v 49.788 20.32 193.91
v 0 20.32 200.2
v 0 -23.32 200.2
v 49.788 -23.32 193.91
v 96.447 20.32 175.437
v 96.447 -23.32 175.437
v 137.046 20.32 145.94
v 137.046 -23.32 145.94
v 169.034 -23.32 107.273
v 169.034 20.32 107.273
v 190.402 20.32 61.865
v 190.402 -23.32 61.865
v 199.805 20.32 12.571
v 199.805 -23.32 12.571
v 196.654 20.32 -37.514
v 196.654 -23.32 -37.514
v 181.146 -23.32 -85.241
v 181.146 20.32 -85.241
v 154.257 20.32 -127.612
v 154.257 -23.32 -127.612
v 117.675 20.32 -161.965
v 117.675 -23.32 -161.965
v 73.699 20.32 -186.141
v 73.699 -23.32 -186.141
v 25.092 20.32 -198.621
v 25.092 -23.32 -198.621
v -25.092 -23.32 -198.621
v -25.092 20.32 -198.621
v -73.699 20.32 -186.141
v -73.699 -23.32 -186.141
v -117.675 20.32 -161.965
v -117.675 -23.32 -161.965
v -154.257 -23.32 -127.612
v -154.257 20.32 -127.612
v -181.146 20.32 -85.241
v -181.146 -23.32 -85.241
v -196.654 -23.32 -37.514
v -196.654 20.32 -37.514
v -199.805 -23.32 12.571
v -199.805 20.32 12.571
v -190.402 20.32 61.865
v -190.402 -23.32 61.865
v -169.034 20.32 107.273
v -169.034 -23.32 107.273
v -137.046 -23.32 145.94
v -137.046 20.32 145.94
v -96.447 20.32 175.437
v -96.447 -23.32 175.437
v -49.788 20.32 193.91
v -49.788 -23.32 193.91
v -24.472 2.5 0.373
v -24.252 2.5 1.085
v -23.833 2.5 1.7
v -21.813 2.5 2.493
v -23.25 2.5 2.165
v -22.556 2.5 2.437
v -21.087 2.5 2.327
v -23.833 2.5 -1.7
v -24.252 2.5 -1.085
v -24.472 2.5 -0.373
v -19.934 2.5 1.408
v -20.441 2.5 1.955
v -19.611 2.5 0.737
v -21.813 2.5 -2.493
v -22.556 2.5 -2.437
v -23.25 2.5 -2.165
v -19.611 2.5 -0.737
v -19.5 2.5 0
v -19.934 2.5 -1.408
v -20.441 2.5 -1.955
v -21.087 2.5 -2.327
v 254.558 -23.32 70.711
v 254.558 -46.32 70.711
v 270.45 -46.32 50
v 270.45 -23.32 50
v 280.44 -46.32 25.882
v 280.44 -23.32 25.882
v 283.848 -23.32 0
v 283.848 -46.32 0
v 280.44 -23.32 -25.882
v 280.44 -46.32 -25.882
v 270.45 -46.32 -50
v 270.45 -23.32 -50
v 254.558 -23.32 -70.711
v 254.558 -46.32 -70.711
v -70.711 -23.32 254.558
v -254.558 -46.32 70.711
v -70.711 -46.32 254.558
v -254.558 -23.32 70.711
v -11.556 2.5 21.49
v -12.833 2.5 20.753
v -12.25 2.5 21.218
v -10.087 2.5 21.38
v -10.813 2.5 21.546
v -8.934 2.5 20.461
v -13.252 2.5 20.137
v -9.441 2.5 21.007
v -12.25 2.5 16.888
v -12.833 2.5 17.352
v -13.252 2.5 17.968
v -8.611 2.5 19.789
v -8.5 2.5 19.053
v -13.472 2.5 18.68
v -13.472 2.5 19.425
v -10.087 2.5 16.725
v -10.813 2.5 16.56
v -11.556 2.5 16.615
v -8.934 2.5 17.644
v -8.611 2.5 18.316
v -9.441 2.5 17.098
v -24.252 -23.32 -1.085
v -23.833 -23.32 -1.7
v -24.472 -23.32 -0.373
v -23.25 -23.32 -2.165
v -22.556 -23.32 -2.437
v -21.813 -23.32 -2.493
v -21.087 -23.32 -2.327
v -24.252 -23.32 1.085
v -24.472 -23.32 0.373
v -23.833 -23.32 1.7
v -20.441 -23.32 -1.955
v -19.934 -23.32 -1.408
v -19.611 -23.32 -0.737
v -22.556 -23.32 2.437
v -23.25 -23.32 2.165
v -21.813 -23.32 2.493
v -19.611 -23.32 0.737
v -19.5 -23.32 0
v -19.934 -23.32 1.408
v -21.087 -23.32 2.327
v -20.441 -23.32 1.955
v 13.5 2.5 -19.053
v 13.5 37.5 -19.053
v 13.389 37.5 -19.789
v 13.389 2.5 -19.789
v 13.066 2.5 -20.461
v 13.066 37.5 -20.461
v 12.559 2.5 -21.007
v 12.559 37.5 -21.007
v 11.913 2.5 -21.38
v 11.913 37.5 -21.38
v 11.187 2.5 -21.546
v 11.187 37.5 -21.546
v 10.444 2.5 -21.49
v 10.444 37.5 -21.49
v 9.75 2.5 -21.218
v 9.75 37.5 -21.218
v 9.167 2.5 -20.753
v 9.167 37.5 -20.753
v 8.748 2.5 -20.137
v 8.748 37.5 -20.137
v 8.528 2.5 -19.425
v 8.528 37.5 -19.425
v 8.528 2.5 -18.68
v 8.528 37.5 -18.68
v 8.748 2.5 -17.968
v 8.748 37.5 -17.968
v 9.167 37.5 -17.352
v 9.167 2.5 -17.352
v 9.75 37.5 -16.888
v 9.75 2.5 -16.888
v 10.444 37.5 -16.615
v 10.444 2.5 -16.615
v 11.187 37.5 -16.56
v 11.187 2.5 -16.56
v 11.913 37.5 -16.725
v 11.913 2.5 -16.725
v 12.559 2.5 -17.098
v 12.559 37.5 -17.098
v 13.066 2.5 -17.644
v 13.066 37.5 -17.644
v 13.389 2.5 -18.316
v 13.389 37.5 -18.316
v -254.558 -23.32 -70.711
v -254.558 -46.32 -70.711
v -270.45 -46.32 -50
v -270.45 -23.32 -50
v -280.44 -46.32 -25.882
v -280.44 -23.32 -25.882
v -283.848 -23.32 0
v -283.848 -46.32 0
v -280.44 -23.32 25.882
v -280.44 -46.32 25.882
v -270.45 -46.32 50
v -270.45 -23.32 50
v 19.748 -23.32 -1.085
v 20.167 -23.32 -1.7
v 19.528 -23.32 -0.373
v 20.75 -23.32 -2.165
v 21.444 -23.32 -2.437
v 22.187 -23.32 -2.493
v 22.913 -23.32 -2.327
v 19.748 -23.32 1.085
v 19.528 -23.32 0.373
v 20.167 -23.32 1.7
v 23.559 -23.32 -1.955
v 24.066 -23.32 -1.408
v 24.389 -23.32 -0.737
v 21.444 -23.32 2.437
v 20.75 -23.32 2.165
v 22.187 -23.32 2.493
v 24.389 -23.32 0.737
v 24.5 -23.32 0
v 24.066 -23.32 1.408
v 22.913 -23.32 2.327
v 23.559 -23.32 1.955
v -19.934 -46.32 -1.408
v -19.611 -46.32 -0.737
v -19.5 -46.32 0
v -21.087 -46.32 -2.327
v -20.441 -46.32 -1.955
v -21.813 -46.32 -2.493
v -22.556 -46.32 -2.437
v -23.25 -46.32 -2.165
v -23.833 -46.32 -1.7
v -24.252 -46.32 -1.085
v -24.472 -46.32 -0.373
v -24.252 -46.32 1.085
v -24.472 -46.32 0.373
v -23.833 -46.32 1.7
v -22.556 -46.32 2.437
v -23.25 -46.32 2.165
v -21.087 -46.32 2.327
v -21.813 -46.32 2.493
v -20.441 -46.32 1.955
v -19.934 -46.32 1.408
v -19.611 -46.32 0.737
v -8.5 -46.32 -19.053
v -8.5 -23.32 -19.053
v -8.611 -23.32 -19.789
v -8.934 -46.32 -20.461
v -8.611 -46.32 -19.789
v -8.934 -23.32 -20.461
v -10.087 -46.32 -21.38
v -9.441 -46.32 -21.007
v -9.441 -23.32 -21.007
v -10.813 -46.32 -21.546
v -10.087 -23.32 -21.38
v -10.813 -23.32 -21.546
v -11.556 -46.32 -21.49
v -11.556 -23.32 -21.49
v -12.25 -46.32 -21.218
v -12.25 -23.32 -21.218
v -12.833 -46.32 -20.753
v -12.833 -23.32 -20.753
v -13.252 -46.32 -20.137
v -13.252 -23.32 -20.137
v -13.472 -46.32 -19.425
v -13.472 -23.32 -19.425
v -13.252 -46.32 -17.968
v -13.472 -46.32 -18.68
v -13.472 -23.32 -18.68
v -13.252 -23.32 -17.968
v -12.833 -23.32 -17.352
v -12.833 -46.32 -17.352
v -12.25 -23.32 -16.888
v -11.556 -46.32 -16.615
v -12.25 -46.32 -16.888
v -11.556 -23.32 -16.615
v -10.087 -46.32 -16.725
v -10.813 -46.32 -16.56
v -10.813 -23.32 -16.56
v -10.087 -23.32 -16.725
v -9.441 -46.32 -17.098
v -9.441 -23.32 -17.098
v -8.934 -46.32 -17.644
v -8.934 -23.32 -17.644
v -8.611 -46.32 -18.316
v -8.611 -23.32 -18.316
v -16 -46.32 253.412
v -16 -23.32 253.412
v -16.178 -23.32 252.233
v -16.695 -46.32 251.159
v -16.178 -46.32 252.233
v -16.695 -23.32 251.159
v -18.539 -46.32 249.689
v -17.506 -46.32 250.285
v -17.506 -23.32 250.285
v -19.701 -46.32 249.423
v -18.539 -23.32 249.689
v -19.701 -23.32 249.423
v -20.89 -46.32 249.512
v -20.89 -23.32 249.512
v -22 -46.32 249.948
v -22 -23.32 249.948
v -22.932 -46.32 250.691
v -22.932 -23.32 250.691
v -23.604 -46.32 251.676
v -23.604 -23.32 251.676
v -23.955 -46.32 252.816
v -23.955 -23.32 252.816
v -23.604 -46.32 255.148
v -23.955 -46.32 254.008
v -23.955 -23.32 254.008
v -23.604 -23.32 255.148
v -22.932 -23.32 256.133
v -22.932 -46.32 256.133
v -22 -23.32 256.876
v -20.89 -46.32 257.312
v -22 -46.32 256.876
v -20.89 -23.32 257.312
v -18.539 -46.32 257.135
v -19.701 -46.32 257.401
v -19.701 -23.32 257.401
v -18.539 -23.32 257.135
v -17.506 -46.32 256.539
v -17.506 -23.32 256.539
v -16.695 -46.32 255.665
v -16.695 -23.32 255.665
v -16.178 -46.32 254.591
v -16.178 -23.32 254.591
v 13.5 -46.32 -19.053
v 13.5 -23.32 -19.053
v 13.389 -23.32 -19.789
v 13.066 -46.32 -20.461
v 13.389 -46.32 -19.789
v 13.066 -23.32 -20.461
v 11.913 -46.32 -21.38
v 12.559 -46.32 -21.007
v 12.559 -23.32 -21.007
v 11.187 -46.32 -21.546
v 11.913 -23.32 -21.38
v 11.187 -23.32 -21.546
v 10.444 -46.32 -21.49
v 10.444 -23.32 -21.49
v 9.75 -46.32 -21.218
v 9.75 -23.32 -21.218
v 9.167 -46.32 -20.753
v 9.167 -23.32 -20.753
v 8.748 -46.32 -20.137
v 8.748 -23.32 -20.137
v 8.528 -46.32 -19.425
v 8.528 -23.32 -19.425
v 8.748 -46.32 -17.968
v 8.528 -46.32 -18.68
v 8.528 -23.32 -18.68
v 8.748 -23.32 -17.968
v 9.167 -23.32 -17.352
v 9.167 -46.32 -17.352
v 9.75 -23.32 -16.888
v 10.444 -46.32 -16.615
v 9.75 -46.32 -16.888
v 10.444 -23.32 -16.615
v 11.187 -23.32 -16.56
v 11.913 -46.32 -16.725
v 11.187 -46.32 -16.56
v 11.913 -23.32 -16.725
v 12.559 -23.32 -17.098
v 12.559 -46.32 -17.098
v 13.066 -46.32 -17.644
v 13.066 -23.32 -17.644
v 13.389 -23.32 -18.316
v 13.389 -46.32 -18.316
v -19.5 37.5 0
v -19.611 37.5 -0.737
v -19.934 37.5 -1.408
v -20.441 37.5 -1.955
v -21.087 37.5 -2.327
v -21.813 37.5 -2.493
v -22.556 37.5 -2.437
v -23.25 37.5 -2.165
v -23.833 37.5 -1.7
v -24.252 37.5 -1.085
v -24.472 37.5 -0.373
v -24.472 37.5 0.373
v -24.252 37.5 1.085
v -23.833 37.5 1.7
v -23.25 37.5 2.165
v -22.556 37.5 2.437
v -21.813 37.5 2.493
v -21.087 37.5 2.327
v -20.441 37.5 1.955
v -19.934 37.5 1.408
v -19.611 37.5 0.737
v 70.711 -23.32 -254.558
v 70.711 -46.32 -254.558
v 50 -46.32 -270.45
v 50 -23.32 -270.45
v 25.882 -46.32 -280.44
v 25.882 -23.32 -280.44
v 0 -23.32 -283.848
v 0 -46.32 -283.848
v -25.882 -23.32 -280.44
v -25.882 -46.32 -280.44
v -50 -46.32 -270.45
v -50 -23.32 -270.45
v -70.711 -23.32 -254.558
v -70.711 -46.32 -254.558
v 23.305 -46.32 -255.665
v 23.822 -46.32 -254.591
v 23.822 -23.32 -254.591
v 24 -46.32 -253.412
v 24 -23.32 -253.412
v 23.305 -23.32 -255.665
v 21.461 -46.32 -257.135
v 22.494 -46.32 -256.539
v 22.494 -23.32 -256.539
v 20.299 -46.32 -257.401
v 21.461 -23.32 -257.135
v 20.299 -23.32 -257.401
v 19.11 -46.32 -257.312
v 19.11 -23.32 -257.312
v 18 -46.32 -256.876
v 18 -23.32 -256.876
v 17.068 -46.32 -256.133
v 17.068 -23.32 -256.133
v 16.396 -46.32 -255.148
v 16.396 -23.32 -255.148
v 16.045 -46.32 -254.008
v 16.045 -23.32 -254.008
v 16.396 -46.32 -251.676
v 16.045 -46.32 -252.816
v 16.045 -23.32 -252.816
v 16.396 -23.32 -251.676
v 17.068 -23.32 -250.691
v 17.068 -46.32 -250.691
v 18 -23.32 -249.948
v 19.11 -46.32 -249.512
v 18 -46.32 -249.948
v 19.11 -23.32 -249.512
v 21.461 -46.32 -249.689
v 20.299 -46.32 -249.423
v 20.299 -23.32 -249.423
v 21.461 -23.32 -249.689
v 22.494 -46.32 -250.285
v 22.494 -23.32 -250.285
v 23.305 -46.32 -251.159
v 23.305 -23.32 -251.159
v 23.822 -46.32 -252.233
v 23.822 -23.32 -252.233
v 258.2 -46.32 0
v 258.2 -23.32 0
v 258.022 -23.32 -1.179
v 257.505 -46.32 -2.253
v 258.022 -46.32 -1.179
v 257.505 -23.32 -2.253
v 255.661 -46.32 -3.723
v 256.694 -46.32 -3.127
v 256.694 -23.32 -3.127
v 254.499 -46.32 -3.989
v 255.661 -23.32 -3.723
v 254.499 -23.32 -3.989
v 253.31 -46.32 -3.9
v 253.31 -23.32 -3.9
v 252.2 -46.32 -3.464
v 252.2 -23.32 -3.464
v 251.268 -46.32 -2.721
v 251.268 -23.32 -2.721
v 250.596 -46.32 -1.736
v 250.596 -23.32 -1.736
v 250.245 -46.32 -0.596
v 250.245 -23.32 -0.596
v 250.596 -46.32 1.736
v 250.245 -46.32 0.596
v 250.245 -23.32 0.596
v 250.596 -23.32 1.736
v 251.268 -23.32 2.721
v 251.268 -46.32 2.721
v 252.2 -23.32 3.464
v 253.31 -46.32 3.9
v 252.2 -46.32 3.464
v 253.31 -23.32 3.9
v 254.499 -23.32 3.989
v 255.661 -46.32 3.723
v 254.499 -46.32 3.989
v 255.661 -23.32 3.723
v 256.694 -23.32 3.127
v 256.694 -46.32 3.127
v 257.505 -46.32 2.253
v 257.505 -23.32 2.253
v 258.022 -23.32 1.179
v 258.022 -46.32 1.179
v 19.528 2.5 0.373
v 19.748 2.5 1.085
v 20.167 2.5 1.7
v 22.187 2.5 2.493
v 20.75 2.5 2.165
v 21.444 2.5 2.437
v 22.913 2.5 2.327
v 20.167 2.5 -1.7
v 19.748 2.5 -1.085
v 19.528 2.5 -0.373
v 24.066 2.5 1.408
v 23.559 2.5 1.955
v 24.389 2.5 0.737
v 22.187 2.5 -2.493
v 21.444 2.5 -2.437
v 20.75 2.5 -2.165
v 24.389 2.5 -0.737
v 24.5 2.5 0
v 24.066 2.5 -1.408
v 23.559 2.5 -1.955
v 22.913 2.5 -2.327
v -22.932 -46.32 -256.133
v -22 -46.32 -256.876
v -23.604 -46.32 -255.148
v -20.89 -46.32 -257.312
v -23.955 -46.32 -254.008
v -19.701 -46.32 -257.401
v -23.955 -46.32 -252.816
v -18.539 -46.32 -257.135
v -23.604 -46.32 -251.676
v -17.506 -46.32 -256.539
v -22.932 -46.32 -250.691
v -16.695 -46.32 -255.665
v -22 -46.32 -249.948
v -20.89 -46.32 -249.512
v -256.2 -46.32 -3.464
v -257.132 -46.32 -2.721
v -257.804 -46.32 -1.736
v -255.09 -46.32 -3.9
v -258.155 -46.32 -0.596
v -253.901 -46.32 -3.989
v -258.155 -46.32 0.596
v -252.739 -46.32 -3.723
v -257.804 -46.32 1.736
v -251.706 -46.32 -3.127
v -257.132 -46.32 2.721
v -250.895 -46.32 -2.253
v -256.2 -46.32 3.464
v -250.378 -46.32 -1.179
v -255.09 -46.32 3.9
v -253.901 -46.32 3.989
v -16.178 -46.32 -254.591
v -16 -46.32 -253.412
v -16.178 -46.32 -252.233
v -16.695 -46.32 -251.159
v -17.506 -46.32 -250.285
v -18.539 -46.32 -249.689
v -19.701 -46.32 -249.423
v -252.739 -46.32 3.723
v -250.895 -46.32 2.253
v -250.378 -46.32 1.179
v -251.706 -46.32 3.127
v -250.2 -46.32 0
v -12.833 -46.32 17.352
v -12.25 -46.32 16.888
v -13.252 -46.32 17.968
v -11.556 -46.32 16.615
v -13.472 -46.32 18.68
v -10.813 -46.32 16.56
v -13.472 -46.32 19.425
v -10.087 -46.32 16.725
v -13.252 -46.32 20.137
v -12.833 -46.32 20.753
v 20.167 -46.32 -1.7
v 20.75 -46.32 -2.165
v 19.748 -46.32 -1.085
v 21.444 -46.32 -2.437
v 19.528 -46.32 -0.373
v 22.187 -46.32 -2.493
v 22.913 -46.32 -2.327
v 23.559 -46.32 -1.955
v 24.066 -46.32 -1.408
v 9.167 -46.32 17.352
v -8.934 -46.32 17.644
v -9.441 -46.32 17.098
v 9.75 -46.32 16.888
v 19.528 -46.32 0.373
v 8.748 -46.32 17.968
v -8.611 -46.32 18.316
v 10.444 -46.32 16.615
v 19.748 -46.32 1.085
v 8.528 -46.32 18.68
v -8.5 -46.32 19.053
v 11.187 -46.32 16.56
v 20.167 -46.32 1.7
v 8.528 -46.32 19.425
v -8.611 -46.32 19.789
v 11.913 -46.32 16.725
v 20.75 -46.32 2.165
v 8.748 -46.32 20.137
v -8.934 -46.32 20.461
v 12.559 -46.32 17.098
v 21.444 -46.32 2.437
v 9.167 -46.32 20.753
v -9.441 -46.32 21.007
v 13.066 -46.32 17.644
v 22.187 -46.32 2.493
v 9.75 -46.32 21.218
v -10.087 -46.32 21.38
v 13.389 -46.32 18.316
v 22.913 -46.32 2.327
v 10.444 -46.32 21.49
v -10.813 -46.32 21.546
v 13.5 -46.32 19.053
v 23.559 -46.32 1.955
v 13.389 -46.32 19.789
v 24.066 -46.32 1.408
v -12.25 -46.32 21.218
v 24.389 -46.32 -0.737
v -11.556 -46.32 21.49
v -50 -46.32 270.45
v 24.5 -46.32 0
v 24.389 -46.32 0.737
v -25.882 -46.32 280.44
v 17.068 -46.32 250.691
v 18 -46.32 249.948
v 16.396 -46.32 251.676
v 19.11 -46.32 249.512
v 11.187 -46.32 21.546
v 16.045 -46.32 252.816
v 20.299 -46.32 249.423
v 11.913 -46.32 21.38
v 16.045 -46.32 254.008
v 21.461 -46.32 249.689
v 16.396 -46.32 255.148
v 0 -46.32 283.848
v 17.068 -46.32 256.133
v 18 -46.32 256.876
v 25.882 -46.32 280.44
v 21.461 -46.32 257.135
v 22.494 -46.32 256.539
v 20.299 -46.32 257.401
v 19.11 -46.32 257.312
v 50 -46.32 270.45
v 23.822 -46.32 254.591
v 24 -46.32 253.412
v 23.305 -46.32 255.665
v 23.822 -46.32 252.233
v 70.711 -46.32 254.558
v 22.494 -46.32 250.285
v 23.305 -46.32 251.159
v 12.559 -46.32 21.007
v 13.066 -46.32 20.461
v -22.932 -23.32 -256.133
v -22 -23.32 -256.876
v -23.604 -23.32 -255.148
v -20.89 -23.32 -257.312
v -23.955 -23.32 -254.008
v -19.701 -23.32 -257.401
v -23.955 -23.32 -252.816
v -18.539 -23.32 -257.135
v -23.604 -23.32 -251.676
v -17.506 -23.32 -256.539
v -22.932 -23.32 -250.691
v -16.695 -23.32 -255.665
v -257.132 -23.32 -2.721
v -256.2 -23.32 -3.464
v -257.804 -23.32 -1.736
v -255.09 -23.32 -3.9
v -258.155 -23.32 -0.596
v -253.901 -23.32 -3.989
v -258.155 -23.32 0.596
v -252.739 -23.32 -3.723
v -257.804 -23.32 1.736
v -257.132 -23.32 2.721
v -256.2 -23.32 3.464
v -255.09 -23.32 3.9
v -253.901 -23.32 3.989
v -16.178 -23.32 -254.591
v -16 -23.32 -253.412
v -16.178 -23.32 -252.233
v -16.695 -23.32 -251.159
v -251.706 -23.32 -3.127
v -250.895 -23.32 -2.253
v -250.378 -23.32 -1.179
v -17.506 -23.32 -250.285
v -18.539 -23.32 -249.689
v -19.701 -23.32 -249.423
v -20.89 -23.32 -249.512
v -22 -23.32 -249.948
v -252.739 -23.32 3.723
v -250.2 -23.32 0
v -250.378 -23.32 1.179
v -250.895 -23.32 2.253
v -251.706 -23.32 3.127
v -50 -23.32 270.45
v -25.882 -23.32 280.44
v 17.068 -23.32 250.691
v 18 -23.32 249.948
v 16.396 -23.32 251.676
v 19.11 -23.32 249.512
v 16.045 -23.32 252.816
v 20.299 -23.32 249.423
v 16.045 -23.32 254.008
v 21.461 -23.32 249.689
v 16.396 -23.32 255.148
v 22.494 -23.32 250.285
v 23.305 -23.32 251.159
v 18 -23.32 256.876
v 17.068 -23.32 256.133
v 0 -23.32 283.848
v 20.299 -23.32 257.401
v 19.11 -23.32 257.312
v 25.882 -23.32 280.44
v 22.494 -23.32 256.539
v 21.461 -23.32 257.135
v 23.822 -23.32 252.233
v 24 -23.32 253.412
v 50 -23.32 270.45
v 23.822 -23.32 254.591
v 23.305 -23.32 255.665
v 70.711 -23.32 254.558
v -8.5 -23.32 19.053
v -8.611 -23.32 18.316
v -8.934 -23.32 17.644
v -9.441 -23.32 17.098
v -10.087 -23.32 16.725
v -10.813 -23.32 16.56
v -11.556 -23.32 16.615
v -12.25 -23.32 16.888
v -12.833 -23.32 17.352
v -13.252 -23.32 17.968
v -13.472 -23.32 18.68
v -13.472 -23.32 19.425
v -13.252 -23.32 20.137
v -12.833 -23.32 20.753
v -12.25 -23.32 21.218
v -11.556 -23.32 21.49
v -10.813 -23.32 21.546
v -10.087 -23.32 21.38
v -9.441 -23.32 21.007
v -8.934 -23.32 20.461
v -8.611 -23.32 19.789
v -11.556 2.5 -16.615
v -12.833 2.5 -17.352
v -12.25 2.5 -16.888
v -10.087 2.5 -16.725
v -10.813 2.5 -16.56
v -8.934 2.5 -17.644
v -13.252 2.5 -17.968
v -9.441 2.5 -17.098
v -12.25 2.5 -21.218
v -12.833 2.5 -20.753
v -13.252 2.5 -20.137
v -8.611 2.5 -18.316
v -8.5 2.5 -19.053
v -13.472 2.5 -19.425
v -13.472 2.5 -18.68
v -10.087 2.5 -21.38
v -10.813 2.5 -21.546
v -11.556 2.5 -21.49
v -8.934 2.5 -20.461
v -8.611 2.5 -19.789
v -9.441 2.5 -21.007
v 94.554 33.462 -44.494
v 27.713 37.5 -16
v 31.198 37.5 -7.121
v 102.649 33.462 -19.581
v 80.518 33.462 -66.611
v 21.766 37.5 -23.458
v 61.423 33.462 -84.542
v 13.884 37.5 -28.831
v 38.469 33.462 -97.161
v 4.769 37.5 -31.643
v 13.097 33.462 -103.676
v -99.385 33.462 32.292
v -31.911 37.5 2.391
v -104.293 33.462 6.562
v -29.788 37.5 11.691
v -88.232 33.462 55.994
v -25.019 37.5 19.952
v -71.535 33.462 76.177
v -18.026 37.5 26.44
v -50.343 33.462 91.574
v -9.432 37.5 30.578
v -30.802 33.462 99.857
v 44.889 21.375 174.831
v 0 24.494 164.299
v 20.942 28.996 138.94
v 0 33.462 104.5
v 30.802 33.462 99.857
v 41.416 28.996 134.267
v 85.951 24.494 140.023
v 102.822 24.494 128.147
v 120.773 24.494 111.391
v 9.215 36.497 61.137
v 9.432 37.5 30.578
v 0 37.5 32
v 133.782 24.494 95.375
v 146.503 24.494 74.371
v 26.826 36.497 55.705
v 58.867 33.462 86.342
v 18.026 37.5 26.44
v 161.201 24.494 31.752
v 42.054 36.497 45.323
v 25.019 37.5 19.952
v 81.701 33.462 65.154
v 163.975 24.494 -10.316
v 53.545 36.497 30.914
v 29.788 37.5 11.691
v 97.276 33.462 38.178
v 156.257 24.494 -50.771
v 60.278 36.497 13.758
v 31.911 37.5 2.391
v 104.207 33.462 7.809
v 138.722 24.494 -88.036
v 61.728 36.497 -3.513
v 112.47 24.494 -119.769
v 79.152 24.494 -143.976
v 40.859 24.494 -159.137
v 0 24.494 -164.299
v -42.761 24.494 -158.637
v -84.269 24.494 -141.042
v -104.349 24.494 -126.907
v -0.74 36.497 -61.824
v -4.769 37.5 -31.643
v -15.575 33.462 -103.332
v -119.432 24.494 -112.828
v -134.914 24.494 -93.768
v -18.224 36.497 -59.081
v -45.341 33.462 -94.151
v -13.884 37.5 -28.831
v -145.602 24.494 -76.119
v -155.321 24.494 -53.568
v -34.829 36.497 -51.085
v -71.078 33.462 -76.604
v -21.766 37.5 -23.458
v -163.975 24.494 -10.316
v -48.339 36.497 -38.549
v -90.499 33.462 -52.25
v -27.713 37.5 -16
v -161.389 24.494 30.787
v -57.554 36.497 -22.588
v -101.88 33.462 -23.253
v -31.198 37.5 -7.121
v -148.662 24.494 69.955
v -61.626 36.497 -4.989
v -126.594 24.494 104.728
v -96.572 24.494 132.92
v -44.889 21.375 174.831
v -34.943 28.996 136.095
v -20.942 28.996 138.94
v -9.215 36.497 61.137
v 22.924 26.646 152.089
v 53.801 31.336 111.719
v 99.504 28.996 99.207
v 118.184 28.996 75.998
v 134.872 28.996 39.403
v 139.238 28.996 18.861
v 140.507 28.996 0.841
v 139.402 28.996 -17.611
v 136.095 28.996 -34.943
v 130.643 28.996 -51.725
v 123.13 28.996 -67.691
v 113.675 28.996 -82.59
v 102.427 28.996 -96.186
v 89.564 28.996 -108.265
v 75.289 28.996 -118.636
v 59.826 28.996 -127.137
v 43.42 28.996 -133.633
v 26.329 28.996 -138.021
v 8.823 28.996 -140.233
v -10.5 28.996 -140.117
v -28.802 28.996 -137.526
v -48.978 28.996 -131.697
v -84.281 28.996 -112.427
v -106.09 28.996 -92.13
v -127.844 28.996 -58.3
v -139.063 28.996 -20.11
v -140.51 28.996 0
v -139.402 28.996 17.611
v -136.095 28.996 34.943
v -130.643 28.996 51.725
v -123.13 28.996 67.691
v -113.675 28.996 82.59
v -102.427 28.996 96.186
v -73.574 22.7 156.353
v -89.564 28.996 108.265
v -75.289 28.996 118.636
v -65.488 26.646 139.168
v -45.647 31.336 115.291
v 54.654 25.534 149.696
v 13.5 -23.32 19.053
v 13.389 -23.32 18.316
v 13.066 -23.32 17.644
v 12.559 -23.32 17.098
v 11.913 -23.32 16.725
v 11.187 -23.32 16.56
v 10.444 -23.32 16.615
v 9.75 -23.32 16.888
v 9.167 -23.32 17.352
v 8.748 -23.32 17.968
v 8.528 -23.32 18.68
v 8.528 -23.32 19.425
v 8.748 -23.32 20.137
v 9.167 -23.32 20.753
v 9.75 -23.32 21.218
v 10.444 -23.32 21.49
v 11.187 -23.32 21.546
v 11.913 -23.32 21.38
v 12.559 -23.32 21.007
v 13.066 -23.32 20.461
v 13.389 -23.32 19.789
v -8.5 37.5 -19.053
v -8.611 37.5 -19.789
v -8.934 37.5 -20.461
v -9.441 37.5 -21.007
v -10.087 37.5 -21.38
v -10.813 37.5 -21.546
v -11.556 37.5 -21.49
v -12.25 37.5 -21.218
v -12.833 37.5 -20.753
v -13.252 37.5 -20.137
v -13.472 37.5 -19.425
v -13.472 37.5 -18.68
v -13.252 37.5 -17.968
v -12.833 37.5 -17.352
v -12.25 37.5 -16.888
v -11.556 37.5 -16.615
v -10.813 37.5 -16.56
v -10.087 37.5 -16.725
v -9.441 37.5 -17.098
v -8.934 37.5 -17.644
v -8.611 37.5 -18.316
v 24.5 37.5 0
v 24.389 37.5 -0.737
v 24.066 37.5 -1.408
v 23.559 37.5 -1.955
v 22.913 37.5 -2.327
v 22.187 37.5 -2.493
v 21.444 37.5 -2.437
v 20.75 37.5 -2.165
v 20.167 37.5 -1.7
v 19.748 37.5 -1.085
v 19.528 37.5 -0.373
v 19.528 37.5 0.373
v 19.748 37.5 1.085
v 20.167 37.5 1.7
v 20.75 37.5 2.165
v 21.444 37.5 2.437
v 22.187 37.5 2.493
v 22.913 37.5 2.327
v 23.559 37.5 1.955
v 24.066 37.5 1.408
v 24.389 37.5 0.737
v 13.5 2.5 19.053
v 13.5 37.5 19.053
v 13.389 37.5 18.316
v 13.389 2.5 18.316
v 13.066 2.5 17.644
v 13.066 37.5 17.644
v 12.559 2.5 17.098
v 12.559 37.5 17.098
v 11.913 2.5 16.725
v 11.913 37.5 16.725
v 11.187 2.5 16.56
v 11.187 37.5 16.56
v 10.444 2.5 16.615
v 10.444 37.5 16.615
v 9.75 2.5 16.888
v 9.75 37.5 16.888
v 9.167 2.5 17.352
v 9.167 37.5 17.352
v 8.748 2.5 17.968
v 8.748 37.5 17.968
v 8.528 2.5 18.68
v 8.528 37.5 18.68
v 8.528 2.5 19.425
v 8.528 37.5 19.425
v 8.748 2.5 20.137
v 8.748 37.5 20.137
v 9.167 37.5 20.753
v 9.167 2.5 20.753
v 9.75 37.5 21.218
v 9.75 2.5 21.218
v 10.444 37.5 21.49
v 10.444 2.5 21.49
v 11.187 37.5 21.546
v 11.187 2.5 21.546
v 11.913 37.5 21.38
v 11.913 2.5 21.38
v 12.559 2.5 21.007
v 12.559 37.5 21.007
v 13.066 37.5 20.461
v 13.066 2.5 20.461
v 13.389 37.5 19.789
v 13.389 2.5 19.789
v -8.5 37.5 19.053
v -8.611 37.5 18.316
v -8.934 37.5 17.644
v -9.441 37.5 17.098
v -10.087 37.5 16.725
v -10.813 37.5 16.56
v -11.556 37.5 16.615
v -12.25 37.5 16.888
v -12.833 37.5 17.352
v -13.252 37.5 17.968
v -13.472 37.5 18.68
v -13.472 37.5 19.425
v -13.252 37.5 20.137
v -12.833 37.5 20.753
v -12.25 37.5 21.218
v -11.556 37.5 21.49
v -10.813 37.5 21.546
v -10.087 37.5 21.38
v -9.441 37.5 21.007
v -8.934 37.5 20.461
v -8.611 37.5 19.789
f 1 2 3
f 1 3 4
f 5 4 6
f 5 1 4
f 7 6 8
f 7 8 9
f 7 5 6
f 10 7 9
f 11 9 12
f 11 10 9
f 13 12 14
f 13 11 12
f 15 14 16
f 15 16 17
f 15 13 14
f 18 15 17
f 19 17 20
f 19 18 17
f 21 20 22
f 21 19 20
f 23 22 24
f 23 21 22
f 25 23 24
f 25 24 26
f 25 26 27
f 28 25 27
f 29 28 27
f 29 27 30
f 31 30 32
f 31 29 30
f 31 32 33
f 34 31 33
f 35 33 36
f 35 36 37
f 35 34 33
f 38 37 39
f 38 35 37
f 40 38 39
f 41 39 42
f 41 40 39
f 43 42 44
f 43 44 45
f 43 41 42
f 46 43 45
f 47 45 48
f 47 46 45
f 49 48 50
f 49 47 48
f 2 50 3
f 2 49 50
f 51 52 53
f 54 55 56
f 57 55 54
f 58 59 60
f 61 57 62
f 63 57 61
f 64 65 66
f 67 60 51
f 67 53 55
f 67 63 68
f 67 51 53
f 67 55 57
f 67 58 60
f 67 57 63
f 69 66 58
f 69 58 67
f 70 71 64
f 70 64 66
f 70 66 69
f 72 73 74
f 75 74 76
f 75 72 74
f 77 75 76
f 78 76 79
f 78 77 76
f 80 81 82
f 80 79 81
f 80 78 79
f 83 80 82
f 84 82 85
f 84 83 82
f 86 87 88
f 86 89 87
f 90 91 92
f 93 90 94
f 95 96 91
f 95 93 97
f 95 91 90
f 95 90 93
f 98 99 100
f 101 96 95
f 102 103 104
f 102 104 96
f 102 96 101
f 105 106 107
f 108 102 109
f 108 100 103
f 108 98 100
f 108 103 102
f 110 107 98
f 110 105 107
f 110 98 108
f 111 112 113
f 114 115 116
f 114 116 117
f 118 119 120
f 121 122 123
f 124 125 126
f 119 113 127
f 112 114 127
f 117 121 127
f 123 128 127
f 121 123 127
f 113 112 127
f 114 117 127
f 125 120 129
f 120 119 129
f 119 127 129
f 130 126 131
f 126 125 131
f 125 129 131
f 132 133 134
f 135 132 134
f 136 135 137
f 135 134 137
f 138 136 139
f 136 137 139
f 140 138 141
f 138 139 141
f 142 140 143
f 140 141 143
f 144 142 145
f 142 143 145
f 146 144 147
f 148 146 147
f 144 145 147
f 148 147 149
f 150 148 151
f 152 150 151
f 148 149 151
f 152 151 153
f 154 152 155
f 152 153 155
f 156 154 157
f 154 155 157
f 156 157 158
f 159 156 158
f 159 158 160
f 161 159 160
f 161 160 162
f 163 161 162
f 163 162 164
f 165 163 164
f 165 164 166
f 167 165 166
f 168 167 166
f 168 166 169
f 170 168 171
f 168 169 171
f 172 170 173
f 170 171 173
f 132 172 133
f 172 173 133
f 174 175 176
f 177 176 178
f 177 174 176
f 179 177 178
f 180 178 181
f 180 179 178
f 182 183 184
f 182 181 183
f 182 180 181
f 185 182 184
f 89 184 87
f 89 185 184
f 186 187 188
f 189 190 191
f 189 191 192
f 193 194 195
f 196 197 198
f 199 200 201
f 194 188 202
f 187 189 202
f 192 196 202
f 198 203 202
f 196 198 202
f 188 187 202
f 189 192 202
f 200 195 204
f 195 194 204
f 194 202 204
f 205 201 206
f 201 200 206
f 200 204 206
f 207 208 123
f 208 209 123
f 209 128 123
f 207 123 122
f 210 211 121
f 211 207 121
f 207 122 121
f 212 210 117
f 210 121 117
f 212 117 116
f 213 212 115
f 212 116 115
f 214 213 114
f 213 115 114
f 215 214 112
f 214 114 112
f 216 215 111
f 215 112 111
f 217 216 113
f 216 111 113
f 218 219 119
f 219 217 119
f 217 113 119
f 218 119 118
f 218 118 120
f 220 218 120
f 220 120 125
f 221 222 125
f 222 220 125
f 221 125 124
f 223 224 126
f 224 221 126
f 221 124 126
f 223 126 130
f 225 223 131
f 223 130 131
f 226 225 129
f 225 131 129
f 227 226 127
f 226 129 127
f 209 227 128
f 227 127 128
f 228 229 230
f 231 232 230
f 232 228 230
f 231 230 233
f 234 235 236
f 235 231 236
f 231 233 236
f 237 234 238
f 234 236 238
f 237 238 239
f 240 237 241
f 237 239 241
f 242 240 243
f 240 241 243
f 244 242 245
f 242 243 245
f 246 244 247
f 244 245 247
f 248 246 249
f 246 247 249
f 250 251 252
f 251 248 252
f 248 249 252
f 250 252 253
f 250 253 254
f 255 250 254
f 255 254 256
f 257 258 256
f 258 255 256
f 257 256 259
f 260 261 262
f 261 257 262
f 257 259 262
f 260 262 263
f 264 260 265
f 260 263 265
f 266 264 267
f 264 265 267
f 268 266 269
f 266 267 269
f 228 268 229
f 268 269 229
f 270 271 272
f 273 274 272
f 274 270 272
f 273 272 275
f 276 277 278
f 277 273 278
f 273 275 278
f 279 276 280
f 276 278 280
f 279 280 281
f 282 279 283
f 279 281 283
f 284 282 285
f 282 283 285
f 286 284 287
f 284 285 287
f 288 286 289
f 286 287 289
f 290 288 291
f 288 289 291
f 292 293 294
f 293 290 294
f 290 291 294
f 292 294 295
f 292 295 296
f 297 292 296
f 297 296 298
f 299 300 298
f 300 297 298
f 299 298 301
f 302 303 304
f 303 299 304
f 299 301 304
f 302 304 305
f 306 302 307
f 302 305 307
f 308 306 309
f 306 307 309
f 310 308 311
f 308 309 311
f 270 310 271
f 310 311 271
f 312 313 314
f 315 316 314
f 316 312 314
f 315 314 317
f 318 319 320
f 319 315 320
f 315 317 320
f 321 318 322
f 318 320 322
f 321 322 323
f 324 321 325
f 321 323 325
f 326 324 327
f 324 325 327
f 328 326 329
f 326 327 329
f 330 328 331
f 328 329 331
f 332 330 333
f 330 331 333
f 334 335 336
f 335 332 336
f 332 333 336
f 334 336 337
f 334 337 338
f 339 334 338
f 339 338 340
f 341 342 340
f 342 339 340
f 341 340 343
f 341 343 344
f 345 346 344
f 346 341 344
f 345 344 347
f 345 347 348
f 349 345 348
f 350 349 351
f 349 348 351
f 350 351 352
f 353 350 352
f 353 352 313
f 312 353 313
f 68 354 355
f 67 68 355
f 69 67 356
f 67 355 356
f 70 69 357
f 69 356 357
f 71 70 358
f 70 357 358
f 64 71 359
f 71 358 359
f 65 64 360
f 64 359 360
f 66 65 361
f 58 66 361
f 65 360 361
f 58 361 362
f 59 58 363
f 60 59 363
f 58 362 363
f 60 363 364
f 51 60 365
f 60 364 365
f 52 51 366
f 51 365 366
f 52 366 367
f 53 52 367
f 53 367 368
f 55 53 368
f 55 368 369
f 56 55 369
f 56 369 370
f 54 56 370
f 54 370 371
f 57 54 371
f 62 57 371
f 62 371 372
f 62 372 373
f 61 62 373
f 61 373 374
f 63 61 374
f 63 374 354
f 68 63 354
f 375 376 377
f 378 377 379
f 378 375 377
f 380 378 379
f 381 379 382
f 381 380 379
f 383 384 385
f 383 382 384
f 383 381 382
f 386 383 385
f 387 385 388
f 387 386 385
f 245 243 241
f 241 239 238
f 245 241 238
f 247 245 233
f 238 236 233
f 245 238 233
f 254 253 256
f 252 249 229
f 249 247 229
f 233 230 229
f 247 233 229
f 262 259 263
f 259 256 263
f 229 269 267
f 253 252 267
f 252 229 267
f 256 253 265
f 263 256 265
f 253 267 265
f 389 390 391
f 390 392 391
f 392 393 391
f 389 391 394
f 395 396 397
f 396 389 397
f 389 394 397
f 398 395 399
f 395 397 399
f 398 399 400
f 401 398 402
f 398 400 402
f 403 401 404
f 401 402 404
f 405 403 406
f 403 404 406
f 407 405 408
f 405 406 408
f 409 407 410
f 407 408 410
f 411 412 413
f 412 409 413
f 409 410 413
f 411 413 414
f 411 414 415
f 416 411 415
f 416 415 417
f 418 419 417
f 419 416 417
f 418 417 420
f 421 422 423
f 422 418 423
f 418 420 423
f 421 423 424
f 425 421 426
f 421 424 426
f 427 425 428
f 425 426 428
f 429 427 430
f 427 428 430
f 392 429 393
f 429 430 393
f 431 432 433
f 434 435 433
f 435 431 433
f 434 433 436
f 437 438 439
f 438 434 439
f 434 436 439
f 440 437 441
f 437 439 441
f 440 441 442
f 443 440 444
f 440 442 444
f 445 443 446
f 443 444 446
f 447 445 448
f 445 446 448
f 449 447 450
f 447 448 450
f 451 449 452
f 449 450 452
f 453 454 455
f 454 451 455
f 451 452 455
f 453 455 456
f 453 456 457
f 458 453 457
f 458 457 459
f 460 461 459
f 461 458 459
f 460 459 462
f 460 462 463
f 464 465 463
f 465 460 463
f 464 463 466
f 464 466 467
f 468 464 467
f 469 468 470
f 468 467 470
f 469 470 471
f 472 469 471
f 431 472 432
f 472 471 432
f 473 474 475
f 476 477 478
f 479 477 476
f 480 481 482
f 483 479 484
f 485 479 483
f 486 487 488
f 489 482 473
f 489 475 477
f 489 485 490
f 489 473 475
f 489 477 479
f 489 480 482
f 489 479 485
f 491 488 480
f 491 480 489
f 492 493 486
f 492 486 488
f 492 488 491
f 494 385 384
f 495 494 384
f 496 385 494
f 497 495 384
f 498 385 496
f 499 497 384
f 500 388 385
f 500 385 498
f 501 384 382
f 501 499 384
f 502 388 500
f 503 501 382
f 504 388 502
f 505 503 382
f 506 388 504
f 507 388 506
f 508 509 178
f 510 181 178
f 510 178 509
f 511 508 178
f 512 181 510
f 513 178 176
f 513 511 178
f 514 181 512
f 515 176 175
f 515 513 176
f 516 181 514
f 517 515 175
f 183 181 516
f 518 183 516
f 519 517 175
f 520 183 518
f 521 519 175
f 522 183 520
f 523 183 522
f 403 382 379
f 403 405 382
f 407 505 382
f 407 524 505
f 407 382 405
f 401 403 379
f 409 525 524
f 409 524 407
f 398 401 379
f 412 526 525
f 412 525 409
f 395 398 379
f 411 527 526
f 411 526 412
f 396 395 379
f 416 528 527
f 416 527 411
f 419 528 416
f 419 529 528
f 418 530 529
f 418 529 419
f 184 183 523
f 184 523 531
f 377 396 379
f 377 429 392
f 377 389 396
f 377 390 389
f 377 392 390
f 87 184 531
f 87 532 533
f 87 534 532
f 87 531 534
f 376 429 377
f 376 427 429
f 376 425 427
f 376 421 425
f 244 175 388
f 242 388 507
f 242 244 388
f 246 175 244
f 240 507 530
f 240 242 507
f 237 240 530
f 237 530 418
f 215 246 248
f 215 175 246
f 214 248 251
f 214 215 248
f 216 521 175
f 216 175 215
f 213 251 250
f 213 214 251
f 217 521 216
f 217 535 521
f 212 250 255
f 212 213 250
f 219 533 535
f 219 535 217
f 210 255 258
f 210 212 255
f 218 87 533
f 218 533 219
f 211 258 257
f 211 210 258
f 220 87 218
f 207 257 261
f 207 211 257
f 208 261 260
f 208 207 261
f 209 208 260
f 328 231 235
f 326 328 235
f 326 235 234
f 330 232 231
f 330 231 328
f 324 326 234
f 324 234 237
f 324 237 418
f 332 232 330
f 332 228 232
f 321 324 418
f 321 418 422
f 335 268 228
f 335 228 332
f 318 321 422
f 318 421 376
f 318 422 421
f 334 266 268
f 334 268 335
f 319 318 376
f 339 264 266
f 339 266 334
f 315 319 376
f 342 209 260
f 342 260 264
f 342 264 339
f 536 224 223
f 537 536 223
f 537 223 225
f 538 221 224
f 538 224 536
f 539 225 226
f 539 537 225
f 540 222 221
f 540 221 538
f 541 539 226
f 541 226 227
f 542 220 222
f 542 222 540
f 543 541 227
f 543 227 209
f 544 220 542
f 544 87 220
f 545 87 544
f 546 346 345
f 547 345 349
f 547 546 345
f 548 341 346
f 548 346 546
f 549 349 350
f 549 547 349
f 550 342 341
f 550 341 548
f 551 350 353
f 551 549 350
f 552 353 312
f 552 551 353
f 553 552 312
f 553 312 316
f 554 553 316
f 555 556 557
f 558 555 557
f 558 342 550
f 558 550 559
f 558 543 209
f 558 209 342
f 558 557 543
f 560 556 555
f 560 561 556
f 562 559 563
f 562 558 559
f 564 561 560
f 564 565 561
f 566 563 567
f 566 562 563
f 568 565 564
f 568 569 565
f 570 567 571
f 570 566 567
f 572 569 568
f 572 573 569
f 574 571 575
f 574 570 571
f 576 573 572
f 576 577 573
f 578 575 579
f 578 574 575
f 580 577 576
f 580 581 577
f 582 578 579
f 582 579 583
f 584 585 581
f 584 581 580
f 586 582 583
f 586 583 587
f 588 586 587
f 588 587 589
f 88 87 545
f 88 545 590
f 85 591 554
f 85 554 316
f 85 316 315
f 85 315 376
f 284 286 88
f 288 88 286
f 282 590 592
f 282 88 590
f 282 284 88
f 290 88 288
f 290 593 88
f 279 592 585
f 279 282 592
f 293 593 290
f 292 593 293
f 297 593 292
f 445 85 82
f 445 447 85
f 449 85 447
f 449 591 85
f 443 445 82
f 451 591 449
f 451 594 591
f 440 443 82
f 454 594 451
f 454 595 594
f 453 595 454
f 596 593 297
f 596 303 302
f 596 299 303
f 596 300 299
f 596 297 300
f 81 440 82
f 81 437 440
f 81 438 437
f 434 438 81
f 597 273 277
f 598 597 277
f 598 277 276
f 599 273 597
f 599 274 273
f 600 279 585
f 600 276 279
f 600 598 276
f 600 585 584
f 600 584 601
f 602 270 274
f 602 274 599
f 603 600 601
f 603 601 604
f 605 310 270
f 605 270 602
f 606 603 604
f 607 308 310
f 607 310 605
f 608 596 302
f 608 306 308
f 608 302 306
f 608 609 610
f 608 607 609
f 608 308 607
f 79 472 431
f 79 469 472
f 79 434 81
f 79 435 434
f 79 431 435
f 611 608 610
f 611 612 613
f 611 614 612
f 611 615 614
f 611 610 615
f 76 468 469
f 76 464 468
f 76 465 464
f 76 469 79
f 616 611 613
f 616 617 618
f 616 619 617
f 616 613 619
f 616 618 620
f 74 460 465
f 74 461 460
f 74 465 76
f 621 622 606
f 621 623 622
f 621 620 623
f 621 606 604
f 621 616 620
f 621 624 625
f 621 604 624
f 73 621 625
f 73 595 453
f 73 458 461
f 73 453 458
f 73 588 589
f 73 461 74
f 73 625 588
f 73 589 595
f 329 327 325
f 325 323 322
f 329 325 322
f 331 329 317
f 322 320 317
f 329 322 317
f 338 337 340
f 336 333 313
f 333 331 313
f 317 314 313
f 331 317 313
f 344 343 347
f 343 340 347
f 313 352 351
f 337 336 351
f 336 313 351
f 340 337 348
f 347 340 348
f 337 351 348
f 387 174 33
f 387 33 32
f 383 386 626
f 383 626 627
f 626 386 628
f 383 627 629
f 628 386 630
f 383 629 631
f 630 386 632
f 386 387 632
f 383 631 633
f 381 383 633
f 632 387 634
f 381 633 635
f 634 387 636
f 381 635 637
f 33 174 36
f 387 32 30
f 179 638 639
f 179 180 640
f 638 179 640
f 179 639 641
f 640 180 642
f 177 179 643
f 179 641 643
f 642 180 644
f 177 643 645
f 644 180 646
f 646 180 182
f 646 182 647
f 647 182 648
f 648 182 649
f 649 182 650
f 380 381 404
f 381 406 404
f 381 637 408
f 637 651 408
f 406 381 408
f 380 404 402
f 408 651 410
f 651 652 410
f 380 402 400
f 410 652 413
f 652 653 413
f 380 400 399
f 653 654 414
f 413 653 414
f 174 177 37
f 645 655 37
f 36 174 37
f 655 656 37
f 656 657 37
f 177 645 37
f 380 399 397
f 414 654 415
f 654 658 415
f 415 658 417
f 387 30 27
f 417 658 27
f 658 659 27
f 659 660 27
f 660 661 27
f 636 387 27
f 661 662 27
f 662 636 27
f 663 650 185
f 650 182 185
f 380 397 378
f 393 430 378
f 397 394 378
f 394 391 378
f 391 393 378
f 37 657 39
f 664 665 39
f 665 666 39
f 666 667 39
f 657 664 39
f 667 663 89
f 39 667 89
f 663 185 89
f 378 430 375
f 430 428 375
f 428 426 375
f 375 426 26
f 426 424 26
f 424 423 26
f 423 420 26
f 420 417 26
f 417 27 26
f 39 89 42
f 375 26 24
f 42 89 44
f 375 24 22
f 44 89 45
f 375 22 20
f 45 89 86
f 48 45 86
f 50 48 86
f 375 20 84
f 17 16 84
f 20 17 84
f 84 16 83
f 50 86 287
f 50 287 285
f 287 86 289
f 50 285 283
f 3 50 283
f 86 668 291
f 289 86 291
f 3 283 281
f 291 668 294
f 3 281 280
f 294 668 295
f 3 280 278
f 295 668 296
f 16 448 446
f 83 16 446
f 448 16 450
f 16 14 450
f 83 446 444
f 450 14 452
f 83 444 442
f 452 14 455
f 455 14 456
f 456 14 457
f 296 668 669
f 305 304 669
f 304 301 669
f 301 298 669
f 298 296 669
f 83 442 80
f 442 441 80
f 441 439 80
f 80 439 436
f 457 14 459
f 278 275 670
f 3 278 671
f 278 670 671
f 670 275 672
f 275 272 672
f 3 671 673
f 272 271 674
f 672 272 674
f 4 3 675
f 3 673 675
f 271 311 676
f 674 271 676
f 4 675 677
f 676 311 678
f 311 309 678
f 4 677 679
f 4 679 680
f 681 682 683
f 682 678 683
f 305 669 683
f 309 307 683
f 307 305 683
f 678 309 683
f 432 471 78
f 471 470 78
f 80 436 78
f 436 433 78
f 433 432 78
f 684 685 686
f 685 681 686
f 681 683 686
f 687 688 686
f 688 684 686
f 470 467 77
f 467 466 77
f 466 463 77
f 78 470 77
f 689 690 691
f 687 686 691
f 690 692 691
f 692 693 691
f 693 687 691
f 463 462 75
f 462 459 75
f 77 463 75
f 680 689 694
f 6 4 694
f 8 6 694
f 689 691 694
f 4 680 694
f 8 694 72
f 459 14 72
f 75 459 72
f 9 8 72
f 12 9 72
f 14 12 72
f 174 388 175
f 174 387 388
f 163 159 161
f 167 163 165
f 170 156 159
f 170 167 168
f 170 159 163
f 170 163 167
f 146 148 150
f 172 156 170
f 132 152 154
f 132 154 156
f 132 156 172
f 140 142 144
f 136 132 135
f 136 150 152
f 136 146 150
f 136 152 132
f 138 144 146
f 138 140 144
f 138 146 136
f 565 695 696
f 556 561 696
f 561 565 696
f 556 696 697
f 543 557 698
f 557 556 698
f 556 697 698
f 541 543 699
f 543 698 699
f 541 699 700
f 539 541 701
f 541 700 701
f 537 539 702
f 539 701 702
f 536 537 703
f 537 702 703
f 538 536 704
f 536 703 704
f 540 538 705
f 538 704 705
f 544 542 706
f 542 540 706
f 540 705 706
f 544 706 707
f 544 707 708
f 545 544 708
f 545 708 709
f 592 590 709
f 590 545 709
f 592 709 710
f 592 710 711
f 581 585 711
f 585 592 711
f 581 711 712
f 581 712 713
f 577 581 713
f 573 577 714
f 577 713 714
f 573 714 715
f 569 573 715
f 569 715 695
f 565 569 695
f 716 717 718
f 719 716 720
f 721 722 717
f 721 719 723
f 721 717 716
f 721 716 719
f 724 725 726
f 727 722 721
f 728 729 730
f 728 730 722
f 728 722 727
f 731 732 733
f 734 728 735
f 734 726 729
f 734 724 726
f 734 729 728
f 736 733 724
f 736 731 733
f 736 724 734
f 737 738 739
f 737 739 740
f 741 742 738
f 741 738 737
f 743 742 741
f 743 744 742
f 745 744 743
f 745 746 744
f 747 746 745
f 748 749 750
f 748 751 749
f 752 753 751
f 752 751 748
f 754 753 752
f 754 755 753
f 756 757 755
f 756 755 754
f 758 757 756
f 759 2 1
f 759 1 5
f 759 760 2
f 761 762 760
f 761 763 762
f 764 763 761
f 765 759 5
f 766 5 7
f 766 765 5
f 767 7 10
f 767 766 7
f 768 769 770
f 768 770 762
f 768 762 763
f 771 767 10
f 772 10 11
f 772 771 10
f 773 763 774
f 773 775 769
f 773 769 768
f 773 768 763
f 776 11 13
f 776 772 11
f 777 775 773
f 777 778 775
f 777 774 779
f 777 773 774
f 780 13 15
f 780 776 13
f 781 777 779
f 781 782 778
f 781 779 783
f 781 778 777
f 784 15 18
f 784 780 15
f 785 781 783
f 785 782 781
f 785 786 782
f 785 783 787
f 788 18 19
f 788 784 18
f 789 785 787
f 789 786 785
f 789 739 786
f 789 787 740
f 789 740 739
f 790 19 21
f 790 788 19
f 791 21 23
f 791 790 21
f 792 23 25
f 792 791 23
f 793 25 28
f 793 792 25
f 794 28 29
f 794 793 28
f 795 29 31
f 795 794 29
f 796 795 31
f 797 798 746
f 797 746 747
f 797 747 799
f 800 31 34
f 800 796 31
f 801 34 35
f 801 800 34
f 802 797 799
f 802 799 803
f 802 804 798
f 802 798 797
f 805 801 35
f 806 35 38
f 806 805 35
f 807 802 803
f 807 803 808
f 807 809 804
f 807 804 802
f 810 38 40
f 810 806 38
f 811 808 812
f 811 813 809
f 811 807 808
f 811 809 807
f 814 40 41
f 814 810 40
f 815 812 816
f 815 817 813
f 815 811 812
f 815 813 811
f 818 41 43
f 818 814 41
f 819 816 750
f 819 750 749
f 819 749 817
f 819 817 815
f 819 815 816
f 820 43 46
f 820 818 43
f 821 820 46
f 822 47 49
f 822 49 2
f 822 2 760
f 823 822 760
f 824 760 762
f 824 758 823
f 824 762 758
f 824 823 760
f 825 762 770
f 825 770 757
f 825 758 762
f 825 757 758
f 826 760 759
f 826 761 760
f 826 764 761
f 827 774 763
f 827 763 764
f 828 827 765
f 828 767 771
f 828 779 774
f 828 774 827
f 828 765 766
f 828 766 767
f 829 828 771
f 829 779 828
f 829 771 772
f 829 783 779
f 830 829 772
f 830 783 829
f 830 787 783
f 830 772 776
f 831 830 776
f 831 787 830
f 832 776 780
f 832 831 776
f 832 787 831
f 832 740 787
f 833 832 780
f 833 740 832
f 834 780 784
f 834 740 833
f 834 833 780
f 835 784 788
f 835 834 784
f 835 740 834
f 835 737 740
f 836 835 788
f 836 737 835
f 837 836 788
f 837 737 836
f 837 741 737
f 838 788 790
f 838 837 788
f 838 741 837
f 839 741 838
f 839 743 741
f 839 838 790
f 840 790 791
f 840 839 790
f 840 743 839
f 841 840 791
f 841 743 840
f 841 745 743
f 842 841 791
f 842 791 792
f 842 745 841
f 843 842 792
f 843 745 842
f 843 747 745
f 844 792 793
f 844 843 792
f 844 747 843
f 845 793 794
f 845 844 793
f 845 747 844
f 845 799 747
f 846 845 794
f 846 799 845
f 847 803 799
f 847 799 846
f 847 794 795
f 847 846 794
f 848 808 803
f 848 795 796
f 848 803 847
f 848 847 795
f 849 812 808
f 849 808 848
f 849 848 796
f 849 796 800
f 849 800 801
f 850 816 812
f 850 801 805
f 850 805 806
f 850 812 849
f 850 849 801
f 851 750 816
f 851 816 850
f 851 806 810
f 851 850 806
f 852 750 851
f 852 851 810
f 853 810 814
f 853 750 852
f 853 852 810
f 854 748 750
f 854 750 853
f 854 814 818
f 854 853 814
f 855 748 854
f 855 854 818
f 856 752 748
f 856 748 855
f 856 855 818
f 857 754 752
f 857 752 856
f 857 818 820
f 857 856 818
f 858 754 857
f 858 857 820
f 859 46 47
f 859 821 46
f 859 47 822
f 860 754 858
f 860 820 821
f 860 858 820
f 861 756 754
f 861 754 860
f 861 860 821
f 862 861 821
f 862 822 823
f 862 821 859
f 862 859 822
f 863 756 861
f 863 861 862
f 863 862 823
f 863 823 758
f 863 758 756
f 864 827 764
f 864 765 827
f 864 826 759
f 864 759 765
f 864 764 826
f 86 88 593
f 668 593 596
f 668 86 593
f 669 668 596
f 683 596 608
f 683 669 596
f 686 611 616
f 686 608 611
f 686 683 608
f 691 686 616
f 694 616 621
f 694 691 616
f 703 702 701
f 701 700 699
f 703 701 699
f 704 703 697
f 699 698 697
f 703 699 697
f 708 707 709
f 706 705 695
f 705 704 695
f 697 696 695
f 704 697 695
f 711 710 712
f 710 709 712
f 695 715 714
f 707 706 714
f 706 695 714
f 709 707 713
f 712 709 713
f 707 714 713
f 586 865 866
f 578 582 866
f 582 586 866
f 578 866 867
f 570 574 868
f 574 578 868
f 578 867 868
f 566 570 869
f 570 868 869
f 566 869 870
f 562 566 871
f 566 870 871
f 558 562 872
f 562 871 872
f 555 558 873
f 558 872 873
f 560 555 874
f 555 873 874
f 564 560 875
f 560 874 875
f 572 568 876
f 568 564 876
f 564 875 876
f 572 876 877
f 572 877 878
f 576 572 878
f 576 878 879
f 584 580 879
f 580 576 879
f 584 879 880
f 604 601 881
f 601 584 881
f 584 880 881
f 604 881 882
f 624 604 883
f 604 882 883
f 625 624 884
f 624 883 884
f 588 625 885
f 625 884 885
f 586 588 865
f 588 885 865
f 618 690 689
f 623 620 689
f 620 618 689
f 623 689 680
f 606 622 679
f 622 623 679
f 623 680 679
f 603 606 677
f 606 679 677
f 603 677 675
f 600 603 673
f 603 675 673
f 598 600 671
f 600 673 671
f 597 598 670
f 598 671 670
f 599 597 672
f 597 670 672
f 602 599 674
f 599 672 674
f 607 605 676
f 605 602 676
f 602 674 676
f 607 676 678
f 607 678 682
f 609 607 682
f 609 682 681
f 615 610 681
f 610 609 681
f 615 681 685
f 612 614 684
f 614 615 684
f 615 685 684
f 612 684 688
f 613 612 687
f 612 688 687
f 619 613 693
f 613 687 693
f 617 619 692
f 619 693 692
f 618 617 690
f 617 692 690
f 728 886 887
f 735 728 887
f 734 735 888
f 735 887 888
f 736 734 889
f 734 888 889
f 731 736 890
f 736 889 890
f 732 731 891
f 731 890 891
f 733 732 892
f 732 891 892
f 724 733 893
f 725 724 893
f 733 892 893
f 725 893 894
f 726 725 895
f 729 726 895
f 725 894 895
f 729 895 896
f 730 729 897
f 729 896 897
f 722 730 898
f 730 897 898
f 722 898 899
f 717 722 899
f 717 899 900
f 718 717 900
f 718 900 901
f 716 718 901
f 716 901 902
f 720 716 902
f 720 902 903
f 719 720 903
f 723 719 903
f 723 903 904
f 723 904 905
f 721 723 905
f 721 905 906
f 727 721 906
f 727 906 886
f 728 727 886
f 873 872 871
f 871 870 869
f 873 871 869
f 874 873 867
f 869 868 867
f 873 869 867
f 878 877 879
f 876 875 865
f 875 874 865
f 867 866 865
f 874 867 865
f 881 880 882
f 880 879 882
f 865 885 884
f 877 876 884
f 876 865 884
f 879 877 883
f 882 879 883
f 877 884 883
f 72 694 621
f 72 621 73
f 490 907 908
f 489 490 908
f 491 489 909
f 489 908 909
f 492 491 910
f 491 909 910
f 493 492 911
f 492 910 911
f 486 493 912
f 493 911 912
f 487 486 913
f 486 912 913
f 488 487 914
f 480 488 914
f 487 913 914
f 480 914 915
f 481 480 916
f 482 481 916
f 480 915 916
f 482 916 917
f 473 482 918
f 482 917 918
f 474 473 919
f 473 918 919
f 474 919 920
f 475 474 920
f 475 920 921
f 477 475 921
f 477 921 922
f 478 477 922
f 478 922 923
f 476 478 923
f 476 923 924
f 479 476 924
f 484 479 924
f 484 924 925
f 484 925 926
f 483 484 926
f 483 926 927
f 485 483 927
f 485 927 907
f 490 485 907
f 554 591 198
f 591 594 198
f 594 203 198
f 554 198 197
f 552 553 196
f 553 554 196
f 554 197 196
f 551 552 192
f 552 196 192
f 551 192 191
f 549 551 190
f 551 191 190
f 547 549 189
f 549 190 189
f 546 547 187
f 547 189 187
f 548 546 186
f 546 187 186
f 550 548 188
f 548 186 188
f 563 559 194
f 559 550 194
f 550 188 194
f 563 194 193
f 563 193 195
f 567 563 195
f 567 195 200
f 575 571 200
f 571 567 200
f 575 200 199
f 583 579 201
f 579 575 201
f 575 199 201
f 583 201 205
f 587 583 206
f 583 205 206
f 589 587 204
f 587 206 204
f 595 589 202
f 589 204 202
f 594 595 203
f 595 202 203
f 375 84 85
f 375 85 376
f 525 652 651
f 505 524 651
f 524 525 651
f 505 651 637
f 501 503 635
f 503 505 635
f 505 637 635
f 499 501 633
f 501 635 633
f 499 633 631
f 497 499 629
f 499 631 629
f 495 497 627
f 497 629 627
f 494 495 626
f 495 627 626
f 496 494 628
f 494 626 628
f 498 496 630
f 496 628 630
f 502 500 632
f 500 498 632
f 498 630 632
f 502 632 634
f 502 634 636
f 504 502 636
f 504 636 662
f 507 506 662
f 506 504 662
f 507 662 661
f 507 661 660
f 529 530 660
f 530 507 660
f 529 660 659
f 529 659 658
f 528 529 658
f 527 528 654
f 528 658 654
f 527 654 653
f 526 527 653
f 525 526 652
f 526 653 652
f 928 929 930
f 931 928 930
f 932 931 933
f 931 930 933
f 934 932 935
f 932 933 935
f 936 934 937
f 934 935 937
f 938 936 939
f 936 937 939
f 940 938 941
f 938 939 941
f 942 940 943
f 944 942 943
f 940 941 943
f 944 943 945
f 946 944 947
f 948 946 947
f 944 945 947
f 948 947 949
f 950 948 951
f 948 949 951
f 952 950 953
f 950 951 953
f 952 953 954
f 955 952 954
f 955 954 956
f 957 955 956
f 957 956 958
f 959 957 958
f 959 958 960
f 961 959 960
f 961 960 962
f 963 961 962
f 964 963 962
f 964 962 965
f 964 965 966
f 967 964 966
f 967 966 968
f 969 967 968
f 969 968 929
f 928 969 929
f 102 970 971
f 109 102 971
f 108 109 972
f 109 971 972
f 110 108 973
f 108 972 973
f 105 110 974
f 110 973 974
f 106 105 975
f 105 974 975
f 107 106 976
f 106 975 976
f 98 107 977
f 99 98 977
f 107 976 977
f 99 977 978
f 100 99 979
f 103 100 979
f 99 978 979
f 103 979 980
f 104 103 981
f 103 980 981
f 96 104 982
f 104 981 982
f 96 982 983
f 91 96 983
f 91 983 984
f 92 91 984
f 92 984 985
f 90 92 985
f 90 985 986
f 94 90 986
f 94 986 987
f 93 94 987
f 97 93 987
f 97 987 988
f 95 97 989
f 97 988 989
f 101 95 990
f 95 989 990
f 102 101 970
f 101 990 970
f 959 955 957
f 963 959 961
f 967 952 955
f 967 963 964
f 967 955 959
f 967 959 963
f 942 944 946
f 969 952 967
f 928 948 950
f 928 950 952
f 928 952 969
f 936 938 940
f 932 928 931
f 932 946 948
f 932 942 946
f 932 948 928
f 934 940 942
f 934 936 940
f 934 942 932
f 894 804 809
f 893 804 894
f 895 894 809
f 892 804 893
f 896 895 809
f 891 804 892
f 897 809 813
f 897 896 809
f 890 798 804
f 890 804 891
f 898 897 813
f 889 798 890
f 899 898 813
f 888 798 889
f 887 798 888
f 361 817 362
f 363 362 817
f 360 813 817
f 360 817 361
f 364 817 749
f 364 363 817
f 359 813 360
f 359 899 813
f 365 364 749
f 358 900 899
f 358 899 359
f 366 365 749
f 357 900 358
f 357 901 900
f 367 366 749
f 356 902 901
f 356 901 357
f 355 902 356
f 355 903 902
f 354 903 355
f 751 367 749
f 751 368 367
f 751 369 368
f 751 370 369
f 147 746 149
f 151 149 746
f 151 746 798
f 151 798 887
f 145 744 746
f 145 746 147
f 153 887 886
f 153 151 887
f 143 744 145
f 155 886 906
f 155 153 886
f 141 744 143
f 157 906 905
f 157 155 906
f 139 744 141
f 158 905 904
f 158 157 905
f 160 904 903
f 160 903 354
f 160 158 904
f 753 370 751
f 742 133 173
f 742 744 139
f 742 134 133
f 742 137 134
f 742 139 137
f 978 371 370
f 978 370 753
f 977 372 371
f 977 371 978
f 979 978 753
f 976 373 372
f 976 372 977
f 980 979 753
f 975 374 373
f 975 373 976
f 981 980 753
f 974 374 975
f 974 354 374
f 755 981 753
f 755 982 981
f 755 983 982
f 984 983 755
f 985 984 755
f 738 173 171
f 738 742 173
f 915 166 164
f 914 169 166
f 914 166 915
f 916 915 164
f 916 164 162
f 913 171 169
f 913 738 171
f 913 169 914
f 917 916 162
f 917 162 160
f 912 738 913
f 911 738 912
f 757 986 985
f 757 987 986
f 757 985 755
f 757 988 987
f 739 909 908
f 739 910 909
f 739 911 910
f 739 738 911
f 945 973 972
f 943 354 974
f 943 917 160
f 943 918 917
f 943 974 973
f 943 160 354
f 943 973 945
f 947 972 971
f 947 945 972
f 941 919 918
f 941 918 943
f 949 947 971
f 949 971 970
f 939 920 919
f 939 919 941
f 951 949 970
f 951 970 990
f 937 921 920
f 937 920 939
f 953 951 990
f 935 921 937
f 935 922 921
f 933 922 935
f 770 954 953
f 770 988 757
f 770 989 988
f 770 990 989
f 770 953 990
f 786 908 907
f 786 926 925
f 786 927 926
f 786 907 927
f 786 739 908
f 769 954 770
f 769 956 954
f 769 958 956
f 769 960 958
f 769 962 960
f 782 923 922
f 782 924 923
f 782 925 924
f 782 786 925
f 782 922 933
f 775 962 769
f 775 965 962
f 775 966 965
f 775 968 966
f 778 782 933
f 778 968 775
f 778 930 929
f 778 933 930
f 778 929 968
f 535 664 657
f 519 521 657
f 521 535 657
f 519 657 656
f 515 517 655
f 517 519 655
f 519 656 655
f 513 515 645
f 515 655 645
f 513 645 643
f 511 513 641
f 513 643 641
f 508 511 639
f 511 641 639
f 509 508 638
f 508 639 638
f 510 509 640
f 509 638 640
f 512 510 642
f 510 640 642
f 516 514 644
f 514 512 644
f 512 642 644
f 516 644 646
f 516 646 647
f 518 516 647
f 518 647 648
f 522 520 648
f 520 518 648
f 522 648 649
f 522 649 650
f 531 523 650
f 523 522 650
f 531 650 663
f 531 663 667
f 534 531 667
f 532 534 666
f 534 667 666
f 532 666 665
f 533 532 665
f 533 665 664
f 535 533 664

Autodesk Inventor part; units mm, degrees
ref_plane "YZ Plane" through (0, 0, 0) normal (1, 0, 0) x (0, 1, 0)
ref_plane "XZ Plane" through (0, 0, 0) normal (0, 1, 0) x (-1, 0, 0)
ref_plane "XY Plane" through (0, 0, 0) normal (0, 0, 1) x (1, 0, 0)
sketch "Esquisse2" plane through (0, 0, 0) normal (1, 0, 0) x (0, 1, 0)
  line L0 (-23.32, 215.2) -> (-23.32, 200.2)
  line L1 (-23.32, 200.2) -> (20.32, 200.2)
  spline S0 degree 4 poles (20.32, 200.2) (20.32, 180.2) (23.32, 170.4614) (34.7283, 130.1649) (37.5, 42) (37.5, 32) knots 1 1 1 1 1 2 3 3 3 3 3
  line L2 (37.5, 32) -> (37.5, 0)
  line L3 (-23.32, 200.2) -> (-23.32, 0)
  line L4 (-23.32, 0) -> (37.5, 0)
  line L5 (-36.3967, 0) -> (55.14, 0)
  point P0 (0, 0)
revolve "Révolution1" add sketch "Esquisse2" angle 360 about axis through (0, -10, 0) along (0, 1, 0)
sketch "Esquisse3" plane through (0, -23.32, 0) normal (0, -1, 0) x (1, 0, 0)
  circle A0 centre (-254.2, 0) radius 4
  circle A1 centre (254.2, 0) radius 4
  circle A2 centre (-20, -253.412) radius 4
  circle A3 centre (20, -253.412) radius 4
  circle A4 centre (-20, 253.412) radius 4
  circle A5 centre (20, 253.412) radius 4
  circle A6 centre (-22, 0) radius 2.5
  circle A7 centre (-11, 19.0526) radius 2.5
  circle A8 centre (11, 19.0526) radius 2.5
  circle A9 centre (22, 0) radius 2.5
  circle A10 centre (11, -19.0526) radius 2.5
  circle A11 centre (-11, -19.0526) radius 2.5
  line L0 (70.7107, 254.5584) -> (254.5584, 70.7107)
  arc A12 (254.5584, -70.7107) -> (254.5584, 70.7107) centre (183.8478, 0) ccw
  line L1 (254.5584, -70.7107) -> (70.7107, -254.5584)
  arc A13 (-70.7107, -254.5584) -> (70.7107, -254.5584) centre (0, -183.8478) ccw
  line L2 (-70.7107, -254.5584) -> (-254.5584, -70.7107)
  arc A14 (-254.5584, 70.7107) -> (-254.5584, -70.7107) centre (-183.8478, 0) ccw
  line L3 (-254.5584, 70.7107) -> (-70.7107, 254.5584)
  arc A15 (70.7107, 254.5584) -> (-70.7107, 254.5584) centre (0, 183.8478) ccw
extrude "Extrusion1" add sketch "Esquisse3" along normal blind 23
sketch "Esquisse6" plane through (0, 37.5, 0) normal (0, 1, 0) x (1, 0, 0)
  circle A0 centre (20, -253.412) radius 4
  circle A1 centre (-20, -253.412) radius 4
  circle A2 centre (20, 253.412) radius 4
  circle A3 centre (-20, 253.412) radius 4
  circle A4 centre (254.2, 0) radius 4
  circle A5 centre (-254.2, 0) radius 4
  circle A6 centre (-11, 19.0526) radius 2.5
  circle A7 centre (11, 19.0526) radius 2.5
  circle A8 centre (22, 0) radius 2.5
  circle A9 centre (11, -19.0526) radius 2.5
  circle A10 centre (-11, -19.0526) radius 2.5
  circle A11 centre (-22, 0) radius 2.5
  line L0 (254.5584, -70.7107) -> (70.7107, -254.5584)
  arc A12 (-70.7107, -254.5584) -> (70.7107, -254.5584) centre (0, -183.8478) ccw
  line L1 (-70.7107, -254.5584) -> (-254.5584, -70.7107)
  arc A13 (-254.5584, 70.7107) -> (-254.5584, -70.7107) centre (-183.8478, 0) ccw
  line L2 (-254.5584, 70.7107) -> (-70.7107, 254.5584)
  arc A14 (70.7107, 254.5584) -> (-70.7107, 254.5584) centre (0, 183.8478) ccw
  line L3 (70.7107, 254.5584) -> (254.5584, 70.7107)
  arc A15 (254.5584, -70.7107) -> (254.5584, 70.7107) centre (183.8478, 0) ccw
  point P0 (0, -32)
extrude "Extrusion3" cut sketch "Esquisse6" against normal blind 35 contours A6 | A7 | A8 | A9 | A10 | A11
properties part number "wheel_rim_mold_C"
